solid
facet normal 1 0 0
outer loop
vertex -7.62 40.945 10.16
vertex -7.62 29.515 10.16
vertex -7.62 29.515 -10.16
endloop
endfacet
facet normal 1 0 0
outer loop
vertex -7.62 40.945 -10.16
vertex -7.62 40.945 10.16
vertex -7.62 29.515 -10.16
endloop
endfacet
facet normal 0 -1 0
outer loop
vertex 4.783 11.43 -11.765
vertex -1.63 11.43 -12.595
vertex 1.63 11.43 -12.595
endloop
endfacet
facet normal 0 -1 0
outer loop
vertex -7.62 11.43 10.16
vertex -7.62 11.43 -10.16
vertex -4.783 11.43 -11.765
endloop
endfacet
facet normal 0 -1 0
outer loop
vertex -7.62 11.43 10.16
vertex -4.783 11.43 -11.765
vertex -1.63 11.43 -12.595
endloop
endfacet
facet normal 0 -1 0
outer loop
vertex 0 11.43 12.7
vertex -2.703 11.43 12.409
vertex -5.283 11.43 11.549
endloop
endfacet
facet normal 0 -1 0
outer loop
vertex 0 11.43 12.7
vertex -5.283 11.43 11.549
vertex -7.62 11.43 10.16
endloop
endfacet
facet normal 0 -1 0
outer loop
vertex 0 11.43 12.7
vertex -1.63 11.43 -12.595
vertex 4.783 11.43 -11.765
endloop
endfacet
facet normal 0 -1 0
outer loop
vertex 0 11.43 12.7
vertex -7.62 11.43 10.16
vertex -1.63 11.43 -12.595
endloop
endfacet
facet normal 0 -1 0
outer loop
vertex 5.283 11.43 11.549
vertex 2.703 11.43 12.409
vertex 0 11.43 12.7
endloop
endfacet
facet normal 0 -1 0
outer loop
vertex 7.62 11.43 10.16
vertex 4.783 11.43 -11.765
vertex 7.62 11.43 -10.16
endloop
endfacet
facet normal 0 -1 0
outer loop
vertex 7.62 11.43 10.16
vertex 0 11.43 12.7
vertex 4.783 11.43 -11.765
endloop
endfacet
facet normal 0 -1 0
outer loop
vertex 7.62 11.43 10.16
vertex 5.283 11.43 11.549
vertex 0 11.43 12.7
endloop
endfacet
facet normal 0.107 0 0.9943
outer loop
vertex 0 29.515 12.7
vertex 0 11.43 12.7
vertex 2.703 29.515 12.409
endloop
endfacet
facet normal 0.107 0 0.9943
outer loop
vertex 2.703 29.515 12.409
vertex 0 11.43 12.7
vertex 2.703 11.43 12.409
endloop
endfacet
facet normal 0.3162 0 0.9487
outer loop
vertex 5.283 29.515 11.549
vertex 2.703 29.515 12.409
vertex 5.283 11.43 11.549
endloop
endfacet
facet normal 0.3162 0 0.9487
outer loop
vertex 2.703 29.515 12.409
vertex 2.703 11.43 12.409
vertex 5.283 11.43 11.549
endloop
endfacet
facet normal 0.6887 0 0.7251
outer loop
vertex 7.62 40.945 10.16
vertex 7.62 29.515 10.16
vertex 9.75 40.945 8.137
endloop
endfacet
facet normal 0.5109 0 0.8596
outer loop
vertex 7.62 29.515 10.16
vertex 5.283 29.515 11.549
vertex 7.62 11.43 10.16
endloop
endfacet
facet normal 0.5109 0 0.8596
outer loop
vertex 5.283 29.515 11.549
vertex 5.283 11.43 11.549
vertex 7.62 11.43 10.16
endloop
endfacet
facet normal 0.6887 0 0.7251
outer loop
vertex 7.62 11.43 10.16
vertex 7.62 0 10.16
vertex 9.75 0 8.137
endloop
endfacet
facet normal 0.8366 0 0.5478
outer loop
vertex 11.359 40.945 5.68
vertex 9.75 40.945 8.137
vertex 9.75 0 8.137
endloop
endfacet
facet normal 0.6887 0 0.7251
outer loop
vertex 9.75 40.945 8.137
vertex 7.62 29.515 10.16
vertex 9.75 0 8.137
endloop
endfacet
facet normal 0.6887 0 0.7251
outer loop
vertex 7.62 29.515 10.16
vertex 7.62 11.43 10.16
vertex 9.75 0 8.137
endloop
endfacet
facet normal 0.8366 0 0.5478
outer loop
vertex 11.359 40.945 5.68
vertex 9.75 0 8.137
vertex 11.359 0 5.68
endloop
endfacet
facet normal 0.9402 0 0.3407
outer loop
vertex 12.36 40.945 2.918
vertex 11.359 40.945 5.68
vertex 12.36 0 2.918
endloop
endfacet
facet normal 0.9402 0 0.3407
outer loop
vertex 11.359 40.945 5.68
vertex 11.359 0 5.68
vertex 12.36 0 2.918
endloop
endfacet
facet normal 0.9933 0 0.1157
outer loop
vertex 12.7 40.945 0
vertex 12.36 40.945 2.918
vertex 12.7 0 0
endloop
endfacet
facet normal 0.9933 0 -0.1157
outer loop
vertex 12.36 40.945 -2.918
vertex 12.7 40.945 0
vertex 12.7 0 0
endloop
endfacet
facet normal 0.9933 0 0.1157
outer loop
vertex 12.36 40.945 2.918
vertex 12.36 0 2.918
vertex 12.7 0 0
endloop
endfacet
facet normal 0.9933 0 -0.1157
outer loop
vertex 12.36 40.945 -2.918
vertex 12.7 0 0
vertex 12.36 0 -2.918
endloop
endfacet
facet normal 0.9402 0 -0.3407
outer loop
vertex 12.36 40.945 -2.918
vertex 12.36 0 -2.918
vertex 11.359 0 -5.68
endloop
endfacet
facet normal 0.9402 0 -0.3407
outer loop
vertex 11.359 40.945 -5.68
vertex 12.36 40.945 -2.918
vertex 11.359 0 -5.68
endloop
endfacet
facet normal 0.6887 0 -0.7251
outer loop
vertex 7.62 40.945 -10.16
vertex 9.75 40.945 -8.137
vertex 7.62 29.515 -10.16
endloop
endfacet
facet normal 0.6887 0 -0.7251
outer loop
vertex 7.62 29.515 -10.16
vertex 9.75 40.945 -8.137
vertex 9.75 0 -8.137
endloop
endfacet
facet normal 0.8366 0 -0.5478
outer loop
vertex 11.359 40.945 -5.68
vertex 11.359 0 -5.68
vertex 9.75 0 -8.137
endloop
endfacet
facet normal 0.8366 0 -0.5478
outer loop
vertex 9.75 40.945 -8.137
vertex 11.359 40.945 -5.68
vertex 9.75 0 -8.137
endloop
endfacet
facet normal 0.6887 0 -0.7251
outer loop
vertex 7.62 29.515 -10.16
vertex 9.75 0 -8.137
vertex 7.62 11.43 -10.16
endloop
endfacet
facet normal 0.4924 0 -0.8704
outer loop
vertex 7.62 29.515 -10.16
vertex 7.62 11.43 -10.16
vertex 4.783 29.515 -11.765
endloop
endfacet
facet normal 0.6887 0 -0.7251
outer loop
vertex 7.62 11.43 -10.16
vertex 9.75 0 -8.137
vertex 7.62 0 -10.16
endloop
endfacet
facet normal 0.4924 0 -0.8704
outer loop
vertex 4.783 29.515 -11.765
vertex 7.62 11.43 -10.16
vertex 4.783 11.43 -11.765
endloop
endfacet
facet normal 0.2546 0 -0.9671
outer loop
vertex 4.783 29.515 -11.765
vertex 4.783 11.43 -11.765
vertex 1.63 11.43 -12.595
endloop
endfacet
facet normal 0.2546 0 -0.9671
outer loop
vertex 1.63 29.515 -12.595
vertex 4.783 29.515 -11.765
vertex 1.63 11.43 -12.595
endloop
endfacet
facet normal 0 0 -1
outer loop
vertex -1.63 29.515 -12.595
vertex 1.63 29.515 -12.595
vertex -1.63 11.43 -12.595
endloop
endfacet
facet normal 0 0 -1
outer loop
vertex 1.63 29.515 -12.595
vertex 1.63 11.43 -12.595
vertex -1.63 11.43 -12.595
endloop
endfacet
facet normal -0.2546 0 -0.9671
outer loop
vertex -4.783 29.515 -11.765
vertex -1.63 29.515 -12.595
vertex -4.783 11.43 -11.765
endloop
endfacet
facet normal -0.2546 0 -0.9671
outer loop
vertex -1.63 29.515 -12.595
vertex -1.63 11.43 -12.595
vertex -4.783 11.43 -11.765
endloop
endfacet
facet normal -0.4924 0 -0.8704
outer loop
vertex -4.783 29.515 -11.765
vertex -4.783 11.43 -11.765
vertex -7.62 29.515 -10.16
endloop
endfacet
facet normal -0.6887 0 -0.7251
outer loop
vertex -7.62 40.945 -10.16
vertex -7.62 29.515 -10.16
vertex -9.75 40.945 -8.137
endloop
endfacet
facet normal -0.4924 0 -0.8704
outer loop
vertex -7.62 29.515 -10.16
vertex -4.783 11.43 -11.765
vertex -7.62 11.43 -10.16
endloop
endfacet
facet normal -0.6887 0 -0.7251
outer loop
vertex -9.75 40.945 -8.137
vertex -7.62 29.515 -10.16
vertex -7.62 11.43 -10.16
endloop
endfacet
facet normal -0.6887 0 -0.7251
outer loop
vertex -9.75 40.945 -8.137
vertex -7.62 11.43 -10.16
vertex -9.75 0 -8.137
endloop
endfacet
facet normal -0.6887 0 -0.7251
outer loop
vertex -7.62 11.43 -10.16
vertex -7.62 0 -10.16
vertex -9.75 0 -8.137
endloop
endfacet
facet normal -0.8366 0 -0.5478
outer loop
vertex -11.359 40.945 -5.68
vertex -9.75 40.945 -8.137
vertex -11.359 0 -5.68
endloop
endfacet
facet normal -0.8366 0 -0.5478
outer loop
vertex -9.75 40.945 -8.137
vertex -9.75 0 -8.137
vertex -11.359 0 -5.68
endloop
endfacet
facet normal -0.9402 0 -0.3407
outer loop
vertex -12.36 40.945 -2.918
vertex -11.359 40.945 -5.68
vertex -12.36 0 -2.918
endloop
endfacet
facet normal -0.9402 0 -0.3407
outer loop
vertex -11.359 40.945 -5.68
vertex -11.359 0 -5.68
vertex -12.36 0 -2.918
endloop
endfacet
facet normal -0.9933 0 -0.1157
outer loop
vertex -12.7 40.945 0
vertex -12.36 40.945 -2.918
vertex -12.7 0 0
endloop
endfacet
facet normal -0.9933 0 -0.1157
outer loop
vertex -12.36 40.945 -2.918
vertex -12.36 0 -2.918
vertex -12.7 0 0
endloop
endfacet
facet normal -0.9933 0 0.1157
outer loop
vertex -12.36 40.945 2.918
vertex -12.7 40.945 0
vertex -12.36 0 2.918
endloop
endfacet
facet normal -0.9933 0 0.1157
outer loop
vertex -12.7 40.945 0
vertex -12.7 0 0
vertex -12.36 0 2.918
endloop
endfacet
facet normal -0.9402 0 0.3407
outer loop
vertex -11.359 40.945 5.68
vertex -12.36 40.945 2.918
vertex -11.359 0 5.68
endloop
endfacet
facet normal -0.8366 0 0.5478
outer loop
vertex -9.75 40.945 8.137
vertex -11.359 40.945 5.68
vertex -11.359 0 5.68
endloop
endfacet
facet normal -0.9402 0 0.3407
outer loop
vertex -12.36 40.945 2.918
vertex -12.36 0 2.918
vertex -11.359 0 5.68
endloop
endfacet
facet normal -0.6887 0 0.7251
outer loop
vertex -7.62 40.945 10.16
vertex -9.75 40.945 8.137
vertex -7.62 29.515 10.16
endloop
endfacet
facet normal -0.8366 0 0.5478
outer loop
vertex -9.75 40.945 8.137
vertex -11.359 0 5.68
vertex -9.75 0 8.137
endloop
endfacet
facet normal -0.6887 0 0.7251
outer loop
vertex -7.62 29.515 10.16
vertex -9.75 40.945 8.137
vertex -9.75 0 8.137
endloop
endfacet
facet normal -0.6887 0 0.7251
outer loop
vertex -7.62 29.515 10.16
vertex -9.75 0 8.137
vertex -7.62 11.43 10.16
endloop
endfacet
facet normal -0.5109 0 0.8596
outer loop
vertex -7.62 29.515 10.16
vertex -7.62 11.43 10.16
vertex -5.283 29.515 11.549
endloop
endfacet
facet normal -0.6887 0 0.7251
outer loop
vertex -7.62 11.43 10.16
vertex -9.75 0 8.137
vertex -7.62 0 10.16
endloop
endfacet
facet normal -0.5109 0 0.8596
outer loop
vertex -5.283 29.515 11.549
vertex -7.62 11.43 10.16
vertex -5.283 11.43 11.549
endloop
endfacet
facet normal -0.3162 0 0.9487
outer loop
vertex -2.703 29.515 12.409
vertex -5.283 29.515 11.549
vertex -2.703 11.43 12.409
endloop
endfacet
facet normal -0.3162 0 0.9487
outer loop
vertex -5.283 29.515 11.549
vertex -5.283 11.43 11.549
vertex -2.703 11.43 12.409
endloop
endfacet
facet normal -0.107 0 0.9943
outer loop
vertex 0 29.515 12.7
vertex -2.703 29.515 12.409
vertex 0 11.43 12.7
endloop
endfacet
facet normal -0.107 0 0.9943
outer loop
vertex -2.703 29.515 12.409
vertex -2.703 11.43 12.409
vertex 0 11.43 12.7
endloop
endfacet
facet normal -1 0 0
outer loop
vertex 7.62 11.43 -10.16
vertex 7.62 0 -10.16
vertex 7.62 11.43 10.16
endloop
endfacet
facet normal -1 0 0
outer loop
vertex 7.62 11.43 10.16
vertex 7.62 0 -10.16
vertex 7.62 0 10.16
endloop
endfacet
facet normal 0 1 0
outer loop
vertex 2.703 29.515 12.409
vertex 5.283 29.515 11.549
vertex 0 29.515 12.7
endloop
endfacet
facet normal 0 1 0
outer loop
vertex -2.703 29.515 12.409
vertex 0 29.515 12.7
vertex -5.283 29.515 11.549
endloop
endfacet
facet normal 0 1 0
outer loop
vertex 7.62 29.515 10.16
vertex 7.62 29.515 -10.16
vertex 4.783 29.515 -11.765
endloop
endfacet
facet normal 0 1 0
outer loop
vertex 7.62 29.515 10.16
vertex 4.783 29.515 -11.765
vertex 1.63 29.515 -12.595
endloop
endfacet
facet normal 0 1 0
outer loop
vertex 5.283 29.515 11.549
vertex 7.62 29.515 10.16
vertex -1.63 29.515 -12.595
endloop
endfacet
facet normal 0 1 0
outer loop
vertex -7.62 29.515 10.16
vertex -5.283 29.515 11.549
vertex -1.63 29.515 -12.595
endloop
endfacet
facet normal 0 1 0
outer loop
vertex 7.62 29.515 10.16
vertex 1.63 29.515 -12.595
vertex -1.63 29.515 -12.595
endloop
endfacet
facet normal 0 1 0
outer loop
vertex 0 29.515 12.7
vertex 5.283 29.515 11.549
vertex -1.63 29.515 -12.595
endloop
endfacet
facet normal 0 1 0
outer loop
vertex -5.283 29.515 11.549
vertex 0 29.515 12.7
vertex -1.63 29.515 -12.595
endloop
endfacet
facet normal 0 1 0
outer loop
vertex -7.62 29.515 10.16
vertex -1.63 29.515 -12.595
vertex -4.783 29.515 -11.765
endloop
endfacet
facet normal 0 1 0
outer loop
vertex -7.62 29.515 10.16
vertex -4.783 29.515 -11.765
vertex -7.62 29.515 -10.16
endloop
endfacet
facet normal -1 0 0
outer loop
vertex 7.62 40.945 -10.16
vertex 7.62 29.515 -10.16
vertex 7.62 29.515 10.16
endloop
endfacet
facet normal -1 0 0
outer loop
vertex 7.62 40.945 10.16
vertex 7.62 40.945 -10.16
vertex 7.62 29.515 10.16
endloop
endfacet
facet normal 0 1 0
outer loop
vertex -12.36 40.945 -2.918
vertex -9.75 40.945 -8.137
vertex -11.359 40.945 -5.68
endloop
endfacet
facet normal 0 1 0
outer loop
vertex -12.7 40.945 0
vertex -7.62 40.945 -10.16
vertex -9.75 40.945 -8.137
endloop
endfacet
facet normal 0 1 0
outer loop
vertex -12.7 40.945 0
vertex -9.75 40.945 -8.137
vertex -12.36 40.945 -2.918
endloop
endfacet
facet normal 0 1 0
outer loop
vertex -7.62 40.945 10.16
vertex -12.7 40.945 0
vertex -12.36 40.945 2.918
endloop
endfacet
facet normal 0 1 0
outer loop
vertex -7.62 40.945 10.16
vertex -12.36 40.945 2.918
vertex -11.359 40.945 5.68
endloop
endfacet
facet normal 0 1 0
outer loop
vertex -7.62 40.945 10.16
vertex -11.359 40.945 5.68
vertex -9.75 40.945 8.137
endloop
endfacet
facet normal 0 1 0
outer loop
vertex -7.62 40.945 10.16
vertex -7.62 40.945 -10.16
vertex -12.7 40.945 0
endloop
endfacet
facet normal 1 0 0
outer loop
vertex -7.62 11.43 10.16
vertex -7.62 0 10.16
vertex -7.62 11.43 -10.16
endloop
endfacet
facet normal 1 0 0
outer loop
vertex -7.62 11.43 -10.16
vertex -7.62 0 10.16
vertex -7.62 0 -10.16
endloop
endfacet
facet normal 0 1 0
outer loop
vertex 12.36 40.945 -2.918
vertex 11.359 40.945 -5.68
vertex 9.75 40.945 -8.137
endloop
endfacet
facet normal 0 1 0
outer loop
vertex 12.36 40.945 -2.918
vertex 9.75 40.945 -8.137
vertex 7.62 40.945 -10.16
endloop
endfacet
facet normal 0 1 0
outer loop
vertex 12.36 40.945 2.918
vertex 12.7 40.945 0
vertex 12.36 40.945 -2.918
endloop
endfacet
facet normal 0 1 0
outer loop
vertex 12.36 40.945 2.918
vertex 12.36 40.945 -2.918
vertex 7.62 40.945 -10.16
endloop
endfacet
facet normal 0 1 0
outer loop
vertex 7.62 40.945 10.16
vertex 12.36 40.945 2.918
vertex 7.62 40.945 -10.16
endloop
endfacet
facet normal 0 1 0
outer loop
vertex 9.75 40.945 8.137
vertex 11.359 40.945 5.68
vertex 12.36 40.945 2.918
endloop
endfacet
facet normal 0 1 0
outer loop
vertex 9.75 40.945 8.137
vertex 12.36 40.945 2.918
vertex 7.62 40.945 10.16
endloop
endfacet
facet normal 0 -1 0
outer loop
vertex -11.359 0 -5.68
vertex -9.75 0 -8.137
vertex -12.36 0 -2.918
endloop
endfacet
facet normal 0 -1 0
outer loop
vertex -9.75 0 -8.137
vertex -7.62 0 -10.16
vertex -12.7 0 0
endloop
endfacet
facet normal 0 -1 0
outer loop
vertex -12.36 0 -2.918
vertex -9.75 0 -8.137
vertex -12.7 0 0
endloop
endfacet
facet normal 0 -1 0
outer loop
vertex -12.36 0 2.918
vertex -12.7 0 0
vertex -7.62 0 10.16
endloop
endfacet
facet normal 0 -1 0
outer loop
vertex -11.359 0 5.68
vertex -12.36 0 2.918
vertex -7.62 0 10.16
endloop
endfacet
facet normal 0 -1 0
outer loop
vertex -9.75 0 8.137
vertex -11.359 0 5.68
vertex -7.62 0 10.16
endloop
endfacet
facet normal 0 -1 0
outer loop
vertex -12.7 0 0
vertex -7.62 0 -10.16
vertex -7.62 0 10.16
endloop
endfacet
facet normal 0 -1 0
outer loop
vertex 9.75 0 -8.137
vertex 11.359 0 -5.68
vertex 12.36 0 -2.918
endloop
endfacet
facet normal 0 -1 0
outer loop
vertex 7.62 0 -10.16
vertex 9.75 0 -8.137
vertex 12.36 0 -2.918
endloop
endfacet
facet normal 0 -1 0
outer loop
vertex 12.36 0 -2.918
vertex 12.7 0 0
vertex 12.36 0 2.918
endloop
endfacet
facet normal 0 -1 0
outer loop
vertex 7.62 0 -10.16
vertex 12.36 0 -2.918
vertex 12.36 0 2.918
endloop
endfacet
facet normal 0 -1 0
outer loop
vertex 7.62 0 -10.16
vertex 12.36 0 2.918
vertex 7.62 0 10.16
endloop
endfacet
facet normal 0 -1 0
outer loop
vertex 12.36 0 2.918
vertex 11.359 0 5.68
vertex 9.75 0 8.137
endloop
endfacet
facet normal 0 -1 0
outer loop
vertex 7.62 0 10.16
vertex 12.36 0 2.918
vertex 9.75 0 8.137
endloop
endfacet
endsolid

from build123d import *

# Parameters (mm, degrees)
SKETCH1_R           = 12.7
BOSS_EXTRUDE1_DEPTH = 40.9448
CUT_EXTRUDE1_START  = -11.43
CUT_EXTRUDE1_DEPTH  = 11.43
CUT_EXTRUDE2_DEPTH  = 11.43


with BuildPart() as part:
    # Sketch1 → Boss-Extrude1 (new body)
    with BuildSketch(Plane(origin=(0, 0, 0), x_dir=(1, 0, 0), z_dir=(0, 1, 0))):
        with Locations(Location((0, 0, 0), (0, 0, 270))):
            Circle(SKETCH1_R)
    extrude(amount=BOSS_EXTRUDE1_DEPTH)

    # Sketch2 → Cut-Extrude1 (cut)
    with BuildSketch(Plane(origin=(0, 40.9448, 0), x_dir=(1, 0, 0), z_dir=(0, 1, 0)).offset(CUT_EXTRUDE1_START)):
        with BuildLine():
            Line((7.62, 10.16), (7.62, -10.16))
            ThreePointArc((7.62, -10.16), (0, -12.7), (-7.62, -10.16))
            Line((-7.62, -10.16), (-7.62, 10.16))
            ThreePointArc((-7.62, 10.16), (0, 12.7), (7.62, 10.16))
        make_face()
    extrude(amount=CUT_EXTRUDE1_DEPTH, mode=Mode.SUBTRACT)

    # Sketch3 → Cut-Extrude2 (cut)
    with BuildSketch(Plane.XZ):
        with BuildLine():
            Line((-7.62, 10.16), (-7.62, -10.16))
            ThreePointArc((-7.62, -10.16), (0, -12.7), (7.62, -10.16))
            Line((7.62, -10.16), (7.62, 10.16))
            ThreePointArc((7.62, 10.16), (0, 12.7), (-7.62, 10.16))
        make_face()
    extrude(amount=-CUT_EXTRUDE2_DEPTH, mode=Mode.SUBTRACT)


solid = part.part
